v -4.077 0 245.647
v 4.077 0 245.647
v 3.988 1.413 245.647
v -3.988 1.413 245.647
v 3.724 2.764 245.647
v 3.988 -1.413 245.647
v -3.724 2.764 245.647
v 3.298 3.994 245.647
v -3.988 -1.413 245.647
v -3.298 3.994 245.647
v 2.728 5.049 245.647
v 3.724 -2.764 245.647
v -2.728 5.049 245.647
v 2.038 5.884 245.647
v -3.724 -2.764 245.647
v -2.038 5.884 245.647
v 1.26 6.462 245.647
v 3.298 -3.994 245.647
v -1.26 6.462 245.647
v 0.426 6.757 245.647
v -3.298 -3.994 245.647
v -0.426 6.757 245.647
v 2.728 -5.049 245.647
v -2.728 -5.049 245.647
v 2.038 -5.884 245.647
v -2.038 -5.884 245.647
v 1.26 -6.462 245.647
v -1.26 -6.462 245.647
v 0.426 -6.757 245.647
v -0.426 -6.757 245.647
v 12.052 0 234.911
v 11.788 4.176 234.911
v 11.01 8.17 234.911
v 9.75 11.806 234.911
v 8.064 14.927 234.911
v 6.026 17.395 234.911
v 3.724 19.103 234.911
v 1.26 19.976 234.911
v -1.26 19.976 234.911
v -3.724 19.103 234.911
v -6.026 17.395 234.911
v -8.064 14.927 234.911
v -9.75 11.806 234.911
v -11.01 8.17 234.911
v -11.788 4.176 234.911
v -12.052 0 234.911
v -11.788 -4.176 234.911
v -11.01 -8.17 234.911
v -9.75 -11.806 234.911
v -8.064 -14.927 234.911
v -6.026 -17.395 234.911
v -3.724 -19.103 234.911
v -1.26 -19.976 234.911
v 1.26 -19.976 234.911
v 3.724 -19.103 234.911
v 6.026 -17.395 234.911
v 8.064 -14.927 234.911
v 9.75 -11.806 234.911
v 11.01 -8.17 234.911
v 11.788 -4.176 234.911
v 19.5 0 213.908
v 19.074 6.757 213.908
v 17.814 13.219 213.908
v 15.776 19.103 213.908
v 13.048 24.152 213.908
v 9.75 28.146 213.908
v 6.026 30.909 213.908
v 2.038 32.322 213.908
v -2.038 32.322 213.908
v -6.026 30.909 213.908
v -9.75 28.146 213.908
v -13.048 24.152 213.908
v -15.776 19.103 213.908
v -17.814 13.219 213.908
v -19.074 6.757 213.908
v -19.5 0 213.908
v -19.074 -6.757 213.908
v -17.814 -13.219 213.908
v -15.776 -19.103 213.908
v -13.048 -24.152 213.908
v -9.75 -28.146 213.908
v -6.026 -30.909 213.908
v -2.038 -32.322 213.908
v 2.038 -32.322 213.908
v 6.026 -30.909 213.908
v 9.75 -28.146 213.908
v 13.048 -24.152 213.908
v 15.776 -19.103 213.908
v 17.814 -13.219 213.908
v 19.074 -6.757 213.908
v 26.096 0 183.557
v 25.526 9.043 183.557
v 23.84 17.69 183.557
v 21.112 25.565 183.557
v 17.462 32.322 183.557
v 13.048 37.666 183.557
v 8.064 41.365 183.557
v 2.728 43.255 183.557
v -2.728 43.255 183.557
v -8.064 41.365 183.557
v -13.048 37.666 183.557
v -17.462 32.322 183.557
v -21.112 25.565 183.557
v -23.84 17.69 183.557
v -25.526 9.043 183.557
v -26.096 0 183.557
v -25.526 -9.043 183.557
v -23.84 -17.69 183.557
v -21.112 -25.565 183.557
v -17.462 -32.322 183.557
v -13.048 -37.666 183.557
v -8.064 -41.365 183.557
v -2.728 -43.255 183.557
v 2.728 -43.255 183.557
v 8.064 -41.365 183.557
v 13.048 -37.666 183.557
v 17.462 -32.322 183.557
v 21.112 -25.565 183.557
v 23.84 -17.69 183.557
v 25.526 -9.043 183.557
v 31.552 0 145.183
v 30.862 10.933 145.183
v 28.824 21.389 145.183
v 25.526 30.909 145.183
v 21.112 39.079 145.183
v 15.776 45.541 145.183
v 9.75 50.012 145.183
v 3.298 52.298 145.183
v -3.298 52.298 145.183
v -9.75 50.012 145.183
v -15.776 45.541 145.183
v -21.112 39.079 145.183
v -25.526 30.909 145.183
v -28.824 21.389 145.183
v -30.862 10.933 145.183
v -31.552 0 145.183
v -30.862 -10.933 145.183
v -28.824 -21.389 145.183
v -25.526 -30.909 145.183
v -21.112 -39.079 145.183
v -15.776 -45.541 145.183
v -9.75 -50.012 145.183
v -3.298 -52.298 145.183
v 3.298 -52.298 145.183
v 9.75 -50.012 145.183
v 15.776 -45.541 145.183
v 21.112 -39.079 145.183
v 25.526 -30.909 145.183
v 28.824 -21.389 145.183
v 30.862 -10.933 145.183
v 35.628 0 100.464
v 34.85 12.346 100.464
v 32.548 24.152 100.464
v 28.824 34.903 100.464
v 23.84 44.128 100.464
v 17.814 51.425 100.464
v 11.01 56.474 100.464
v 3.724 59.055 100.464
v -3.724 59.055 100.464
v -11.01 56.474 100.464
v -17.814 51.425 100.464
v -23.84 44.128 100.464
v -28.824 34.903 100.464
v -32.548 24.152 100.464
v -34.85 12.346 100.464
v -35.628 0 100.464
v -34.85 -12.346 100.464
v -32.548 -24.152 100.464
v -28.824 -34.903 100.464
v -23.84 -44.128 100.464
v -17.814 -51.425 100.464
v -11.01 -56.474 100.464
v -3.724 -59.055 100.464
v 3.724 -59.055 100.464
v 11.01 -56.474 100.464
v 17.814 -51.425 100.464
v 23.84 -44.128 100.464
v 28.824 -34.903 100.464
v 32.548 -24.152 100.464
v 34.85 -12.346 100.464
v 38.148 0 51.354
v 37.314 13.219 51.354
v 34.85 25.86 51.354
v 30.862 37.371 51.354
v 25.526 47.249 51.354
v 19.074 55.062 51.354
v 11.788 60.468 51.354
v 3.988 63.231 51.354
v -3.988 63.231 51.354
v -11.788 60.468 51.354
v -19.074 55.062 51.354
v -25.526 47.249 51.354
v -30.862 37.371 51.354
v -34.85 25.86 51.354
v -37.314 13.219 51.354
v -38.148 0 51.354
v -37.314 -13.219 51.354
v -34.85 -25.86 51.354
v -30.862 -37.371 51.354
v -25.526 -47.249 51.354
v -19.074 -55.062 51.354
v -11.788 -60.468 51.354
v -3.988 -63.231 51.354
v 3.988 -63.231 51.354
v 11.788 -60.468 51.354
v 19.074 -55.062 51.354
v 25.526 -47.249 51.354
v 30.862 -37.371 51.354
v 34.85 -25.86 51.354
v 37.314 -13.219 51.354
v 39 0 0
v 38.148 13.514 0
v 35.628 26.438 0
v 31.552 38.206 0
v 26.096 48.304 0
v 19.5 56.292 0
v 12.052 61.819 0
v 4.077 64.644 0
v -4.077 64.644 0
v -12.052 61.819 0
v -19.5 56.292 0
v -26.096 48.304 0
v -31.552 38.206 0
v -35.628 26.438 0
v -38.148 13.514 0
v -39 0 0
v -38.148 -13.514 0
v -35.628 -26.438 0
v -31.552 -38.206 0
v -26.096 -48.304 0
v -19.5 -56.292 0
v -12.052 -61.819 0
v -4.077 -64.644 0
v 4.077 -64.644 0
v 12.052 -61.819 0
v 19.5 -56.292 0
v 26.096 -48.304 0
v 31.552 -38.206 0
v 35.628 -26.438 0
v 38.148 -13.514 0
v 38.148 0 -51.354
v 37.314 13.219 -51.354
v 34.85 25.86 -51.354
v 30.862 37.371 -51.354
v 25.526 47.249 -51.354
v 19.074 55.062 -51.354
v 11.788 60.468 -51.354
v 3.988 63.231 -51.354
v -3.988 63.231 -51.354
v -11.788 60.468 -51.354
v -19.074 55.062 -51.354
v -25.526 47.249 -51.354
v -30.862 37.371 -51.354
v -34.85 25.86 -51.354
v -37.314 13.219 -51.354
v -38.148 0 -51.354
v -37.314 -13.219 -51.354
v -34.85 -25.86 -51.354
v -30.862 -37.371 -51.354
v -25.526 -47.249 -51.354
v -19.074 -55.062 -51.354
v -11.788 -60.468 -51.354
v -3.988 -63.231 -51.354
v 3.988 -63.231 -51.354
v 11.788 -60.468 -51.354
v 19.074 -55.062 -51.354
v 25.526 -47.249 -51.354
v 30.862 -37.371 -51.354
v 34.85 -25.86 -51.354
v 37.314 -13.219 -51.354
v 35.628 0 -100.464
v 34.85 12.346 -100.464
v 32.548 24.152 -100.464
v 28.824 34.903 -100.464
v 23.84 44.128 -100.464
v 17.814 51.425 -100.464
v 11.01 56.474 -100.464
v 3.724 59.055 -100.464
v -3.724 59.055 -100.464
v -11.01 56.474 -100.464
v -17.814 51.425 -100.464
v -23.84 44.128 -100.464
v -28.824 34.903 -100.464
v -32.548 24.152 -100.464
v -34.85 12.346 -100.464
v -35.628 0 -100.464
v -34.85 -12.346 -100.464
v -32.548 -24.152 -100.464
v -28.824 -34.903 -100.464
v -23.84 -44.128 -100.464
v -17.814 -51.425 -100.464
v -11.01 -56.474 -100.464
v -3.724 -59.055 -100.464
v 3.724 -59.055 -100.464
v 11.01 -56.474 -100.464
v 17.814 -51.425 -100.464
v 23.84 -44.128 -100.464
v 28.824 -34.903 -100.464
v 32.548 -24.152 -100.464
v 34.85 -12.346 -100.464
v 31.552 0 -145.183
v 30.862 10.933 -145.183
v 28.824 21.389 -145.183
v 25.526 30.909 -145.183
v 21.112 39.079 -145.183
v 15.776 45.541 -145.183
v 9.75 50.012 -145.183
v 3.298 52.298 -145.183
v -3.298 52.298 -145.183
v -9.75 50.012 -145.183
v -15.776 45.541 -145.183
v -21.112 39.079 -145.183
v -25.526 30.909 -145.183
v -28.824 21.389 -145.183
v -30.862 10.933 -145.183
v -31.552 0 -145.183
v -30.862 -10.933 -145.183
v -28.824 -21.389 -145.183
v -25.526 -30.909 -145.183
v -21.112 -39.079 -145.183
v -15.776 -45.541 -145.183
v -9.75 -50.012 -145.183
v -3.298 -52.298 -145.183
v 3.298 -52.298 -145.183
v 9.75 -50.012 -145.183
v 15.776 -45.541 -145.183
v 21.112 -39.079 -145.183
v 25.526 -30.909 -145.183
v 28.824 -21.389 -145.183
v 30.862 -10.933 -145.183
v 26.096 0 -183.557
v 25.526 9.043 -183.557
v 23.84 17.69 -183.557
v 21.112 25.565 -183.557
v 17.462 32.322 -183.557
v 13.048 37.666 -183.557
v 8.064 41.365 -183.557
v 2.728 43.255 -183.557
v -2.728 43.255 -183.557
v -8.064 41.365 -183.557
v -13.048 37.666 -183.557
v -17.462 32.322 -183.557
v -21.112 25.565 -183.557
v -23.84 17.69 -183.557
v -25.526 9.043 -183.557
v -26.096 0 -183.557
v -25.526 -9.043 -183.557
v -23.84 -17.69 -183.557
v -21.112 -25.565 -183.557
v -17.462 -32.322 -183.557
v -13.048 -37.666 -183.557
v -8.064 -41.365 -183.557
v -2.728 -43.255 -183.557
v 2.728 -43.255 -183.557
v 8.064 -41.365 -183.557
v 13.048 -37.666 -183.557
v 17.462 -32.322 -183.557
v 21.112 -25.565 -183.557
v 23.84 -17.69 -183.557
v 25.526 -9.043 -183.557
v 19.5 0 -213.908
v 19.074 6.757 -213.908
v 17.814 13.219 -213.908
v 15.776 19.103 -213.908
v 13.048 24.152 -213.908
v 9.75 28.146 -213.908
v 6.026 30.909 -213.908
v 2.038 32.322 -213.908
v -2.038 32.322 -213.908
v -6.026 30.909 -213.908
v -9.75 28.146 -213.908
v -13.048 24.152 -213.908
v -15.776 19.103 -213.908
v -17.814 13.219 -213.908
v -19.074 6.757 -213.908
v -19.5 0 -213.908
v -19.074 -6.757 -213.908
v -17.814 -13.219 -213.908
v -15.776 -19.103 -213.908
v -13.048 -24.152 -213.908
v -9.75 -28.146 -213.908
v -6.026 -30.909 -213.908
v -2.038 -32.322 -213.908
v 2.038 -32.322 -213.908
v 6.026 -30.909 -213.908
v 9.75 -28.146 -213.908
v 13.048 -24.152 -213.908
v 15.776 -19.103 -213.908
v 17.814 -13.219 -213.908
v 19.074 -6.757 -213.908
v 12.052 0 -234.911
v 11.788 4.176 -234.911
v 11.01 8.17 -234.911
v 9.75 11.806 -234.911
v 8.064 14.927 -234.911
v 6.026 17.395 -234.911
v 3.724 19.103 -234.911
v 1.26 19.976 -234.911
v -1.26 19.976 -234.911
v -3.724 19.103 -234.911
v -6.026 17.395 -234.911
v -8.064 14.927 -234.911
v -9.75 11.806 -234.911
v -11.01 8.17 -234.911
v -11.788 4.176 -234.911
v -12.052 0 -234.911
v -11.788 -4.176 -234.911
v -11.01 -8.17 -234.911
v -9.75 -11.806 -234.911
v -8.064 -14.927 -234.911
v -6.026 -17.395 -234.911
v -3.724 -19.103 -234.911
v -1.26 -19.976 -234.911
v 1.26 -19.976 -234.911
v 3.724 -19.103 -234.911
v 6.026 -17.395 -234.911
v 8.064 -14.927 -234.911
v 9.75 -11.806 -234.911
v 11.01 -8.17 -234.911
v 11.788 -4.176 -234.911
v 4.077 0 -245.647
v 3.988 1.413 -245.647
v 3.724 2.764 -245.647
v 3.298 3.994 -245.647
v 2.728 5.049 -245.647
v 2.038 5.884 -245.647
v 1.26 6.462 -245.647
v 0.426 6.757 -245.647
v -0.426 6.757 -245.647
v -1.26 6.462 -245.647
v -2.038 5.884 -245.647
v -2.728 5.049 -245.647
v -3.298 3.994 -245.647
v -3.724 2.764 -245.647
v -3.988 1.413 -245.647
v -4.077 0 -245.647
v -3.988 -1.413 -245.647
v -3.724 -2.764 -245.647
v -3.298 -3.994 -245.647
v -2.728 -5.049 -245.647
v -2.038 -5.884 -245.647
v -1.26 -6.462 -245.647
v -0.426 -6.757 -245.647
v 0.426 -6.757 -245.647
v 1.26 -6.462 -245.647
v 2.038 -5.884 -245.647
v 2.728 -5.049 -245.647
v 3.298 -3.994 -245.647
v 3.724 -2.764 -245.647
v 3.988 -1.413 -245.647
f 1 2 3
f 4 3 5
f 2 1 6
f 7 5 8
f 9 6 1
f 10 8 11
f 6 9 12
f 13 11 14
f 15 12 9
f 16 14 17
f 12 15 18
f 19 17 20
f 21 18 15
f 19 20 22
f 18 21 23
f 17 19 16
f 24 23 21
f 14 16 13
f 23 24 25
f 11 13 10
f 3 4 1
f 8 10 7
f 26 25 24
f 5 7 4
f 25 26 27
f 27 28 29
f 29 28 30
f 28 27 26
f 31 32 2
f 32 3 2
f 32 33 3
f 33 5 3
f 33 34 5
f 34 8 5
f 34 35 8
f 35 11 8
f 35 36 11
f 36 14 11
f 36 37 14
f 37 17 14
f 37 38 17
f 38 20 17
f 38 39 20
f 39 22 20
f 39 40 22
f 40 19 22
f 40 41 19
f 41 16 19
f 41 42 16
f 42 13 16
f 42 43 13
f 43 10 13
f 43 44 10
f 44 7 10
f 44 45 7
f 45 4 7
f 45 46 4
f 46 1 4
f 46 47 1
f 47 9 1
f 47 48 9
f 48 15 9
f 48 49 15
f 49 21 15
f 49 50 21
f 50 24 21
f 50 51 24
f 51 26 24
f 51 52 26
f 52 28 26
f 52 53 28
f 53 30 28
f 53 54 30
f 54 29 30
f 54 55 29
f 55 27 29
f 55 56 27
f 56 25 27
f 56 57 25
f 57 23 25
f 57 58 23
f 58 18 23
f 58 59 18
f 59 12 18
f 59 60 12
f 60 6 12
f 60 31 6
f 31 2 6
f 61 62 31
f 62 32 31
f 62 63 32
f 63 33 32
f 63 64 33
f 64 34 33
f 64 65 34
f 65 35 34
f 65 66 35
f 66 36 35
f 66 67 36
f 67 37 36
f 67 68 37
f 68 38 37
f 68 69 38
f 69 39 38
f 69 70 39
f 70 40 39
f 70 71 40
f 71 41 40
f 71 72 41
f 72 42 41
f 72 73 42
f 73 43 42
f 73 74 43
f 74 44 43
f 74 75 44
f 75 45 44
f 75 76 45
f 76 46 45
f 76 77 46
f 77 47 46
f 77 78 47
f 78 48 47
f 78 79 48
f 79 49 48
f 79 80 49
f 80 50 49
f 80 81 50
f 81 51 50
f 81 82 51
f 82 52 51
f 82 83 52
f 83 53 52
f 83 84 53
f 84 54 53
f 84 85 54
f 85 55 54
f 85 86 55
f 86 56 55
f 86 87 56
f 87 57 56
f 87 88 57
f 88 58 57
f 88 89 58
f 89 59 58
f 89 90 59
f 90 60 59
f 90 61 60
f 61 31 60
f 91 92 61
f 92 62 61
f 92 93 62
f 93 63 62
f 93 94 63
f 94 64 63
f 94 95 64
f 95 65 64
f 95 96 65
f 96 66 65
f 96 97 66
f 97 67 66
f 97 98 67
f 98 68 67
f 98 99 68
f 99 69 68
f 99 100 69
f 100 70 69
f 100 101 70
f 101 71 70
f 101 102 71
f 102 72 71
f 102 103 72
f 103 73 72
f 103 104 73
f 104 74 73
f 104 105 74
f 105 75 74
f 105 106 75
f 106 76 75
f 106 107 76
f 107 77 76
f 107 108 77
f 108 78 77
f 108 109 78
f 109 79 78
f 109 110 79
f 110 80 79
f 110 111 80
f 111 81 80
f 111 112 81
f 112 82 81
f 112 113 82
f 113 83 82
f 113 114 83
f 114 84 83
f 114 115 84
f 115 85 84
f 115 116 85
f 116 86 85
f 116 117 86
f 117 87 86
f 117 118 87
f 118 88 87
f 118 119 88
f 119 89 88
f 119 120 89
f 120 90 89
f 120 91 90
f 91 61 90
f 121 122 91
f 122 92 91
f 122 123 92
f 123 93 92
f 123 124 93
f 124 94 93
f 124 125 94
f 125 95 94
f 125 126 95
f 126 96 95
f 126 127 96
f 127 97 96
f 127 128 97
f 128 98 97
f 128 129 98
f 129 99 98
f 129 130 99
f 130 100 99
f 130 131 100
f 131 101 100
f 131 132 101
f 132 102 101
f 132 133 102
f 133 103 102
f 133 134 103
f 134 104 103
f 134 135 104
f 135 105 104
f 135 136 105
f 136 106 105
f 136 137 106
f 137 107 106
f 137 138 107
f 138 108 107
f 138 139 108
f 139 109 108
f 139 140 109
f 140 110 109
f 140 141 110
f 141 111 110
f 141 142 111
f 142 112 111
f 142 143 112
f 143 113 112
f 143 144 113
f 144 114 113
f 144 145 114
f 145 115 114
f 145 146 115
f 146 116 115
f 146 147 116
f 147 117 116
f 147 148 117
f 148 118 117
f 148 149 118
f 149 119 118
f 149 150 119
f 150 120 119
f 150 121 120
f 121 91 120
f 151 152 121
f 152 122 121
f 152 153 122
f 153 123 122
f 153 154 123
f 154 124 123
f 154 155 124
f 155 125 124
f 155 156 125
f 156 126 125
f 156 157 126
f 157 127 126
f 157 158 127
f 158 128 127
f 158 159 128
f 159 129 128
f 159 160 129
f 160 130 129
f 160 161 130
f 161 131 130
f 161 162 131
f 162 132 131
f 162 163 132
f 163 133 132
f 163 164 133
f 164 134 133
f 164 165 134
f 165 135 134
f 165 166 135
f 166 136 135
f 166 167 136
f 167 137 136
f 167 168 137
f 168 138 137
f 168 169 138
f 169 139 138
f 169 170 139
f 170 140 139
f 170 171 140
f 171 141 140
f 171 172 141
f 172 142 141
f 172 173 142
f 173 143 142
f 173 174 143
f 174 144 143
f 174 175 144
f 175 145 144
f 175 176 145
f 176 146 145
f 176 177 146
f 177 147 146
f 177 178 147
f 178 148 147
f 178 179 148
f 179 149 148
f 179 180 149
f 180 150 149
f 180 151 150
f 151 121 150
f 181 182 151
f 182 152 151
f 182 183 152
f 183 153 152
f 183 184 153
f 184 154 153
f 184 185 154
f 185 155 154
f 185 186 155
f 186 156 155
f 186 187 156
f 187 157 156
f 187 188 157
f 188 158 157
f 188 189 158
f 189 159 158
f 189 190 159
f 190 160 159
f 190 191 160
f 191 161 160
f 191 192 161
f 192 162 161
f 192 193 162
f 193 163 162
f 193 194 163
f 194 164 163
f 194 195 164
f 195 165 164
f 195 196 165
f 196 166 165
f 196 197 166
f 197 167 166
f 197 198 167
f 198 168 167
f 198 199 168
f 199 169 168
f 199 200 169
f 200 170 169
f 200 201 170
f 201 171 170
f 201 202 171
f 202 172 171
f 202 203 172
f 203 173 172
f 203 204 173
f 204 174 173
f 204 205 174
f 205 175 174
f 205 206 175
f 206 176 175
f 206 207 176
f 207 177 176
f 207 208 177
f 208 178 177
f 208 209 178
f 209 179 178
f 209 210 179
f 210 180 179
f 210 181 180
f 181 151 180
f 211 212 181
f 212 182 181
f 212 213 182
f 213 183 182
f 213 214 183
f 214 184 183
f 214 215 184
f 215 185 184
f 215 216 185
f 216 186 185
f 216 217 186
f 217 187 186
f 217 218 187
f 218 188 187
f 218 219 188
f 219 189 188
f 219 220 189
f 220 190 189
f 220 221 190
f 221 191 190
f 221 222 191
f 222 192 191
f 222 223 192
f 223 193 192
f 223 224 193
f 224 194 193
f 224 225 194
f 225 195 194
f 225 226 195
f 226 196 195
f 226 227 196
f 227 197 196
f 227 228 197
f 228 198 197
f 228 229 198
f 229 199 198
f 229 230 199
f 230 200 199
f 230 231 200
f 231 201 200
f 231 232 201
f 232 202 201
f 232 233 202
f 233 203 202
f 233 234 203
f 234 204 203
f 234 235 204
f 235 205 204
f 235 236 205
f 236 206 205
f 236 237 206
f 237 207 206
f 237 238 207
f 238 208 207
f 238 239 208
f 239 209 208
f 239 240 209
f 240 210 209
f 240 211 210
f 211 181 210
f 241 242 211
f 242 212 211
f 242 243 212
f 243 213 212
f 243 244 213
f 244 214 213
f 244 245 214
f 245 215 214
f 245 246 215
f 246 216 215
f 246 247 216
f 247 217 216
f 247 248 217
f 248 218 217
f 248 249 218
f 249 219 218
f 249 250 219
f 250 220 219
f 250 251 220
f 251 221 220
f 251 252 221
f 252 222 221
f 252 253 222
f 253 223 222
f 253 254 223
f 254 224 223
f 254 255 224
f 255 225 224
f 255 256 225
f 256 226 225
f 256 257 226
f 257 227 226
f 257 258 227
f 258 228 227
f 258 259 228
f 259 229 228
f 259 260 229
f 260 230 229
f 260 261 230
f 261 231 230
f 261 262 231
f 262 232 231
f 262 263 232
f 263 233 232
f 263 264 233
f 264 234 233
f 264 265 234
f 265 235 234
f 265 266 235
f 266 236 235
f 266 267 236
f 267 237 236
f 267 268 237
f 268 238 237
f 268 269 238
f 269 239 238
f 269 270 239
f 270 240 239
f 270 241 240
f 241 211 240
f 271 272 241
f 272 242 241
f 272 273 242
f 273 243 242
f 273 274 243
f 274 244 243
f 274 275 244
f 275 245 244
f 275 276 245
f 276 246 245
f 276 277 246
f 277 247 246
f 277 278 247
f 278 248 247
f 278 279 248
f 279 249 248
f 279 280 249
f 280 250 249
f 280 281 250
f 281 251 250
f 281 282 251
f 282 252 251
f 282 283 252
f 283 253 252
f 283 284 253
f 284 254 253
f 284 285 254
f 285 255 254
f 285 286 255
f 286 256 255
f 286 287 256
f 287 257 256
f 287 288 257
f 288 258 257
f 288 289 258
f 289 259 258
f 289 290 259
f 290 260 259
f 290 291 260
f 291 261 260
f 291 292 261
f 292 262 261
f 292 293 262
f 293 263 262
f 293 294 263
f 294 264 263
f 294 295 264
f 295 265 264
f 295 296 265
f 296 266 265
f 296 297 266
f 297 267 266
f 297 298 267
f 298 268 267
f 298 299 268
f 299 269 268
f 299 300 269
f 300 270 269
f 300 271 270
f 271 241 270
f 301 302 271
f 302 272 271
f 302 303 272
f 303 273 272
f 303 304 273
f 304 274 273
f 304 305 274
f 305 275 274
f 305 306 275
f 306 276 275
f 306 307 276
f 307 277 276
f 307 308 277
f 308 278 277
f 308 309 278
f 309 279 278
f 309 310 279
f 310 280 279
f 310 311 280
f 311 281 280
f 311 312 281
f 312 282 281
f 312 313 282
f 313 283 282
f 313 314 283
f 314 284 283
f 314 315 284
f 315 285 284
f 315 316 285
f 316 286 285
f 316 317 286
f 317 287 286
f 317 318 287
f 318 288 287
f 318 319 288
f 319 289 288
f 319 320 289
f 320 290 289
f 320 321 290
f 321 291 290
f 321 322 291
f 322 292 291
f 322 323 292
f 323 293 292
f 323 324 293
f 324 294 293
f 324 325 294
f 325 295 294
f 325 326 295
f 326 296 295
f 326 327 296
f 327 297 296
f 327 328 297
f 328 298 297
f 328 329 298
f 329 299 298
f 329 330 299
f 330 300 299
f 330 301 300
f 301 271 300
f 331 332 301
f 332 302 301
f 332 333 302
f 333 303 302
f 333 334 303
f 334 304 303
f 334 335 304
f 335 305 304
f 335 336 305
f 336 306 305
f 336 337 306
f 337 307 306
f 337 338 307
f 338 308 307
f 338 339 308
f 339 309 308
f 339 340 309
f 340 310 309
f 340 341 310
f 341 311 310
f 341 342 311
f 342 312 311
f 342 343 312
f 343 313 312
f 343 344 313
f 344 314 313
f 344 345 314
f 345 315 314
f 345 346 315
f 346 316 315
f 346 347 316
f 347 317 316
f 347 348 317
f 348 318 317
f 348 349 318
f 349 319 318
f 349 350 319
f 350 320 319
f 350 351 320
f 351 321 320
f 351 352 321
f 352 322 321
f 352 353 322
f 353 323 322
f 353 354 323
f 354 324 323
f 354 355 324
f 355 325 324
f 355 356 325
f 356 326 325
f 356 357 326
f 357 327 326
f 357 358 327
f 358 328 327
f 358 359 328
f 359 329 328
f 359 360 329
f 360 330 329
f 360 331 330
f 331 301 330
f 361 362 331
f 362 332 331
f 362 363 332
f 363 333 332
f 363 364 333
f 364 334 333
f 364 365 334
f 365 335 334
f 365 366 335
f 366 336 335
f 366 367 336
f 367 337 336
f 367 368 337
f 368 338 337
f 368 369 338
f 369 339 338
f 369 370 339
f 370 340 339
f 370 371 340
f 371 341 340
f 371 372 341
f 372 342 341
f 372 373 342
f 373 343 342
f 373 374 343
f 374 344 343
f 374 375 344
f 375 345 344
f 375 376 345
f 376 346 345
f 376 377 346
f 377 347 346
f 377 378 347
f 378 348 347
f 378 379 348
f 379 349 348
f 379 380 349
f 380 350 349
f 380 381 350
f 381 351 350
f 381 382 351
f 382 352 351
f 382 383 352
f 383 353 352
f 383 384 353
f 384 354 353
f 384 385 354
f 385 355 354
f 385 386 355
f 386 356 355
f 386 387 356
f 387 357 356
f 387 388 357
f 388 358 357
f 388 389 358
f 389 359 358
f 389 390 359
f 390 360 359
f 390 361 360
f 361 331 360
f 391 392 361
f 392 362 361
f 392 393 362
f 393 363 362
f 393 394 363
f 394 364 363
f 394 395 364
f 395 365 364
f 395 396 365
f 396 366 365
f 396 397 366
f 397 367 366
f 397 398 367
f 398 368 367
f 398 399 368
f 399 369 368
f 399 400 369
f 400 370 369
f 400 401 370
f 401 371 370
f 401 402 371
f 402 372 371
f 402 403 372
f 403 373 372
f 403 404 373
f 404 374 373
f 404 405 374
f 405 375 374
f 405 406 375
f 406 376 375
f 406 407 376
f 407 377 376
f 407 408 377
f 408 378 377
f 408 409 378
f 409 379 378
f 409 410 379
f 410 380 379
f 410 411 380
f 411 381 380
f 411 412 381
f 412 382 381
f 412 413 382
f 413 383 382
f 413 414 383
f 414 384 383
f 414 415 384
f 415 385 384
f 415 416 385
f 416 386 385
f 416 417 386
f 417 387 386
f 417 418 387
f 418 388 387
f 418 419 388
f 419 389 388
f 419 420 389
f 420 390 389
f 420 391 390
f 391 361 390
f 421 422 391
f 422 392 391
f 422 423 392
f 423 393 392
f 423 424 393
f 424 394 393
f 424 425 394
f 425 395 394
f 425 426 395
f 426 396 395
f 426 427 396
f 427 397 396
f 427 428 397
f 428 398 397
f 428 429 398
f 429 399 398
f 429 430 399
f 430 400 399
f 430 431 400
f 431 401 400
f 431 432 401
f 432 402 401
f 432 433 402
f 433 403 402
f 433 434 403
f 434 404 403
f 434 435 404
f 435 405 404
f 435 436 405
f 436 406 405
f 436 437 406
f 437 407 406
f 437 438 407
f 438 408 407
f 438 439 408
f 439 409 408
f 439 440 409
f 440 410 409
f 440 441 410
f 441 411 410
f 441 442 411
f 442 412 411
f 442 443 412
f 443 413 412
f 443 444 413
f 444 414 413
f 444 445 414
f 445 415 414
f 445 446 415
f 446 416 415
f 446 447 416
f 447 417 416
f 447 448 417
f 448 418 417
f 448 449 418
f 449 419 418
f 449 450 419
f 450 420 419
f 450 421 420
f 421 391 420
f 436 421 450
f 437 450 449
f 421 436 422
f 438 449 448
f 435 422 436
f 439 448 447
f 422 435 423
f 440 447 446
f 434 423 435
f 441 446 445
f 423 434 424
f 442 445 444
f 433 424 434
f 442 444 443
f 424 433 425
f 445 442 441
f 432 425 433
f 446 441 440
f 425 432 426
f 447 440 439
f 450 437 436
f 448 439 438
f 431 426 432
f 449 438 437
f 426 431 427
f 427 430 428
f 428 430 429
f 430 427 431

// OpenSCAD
// Generated by SolidPython 1.0.1 on 2020-07-29 00:46:45


scale(v = [3, 5, 19]) {
	sphere(r = 13);
}
/***********************************************
*********      SolidPython code:      **********
************************************************
 
# import packages: SolidPython
from solid import *
from solid.utils import *
from itertools import chain, combinations, permutations


class Resize:

    def __init__(self, scad_file):
        self.scad_file = scad_file
        #self.scad_file = import_scad(scad_file)
        # cone/cylinder param:
        self.r1 = 0
        self.r2 = 0
        self.h = 0
        # rectangular prism param:
        self.w = 0
        self.l = 0
        # ellipse param:
        self.r = 0

    # import OpenScad code (file name corresponds to shape)


    # classify shape + parameters
    def assign(self, param1, param2, param3):
        if self.scad_file == 'cone.scad':
            self.r1 = param1
            self.r2 = param2
            self.h = param3
        elif self.scad_file == 'cylinder.scad':
            self.r1 = param1
            self.r2 = param2
            self.h = param3
        elif self.scad_file == 'rectangularPrism.scad':
            self.h = param1
            self.l = param2
            self.w = param3
        else:
            self.r = param1
            self.h = param2

    # resize parameters
    def iterate(self):
        x = range(3, 20, 2)
        i = 1
        if self.scad_file == 'cone.scad':
            tempList = list(permutations(x, 2))
            for temp in tempList:
                param1 = temp[0]
                param2 = temp[1]
                filepath = 'produced_scad_files/' + 'cone' + str(param1) + '_' + str(param2) + '_' + '.scad'
                scad_render_to_file(cylinder(h=param1, r1=param2, r2=0), filepath)

        elif self.scad_file == 'cylinder.scad':
            tempList = list(permutations(x, 3))
            for temp in tempList:
                param1 = temp[0]
                param2 = temp[1]
                filepath = 'produced_scad_files/' + 'cylinder' + str(param1) + '_' + str(param2) + '_' + '.scad'
                scad_render_to_file(cylinder(h=param1, r1=param2, r2=param2), filepath)

        elif self.scad_file == 'rectangularPrism.scad':
            tempList = list(permutations(x, 3))
            for temp in tempList:
                param1 = temp[0]
                param2 = temp[1]
                param3 = temp[2]
                filepath = 'produced_scad_files/' + 'rectangularPrism' + str(param1) + '_' + str(param2) + '_' + str(
                    param3) + '.scad'
                scad_render_to_file(cube(size=(param1, param2, param3)), filepath)

        elif self.scad_file == 'ellipse.scad':
            tempList = list(permutations(x, 4))
            for temp in tempList:
                param1 = temp[0]
                param2 = temp[1]
                param3 = temp[2]
                param4 = temp[3]
                filepath = 'produced_scad_files/' + 'ellipse' + str(param1) + '_' + str(param2) + '_' + str(param3) + '_' + str(param4) + '.scad'
                scad_render_to_file(scale([param1, param2, param3])(sphere(r=param4)), filepath)

    def render_to_scadfile(self):
        scad_render_to_file(scad, 'example.scad') 
 
************************************************/
